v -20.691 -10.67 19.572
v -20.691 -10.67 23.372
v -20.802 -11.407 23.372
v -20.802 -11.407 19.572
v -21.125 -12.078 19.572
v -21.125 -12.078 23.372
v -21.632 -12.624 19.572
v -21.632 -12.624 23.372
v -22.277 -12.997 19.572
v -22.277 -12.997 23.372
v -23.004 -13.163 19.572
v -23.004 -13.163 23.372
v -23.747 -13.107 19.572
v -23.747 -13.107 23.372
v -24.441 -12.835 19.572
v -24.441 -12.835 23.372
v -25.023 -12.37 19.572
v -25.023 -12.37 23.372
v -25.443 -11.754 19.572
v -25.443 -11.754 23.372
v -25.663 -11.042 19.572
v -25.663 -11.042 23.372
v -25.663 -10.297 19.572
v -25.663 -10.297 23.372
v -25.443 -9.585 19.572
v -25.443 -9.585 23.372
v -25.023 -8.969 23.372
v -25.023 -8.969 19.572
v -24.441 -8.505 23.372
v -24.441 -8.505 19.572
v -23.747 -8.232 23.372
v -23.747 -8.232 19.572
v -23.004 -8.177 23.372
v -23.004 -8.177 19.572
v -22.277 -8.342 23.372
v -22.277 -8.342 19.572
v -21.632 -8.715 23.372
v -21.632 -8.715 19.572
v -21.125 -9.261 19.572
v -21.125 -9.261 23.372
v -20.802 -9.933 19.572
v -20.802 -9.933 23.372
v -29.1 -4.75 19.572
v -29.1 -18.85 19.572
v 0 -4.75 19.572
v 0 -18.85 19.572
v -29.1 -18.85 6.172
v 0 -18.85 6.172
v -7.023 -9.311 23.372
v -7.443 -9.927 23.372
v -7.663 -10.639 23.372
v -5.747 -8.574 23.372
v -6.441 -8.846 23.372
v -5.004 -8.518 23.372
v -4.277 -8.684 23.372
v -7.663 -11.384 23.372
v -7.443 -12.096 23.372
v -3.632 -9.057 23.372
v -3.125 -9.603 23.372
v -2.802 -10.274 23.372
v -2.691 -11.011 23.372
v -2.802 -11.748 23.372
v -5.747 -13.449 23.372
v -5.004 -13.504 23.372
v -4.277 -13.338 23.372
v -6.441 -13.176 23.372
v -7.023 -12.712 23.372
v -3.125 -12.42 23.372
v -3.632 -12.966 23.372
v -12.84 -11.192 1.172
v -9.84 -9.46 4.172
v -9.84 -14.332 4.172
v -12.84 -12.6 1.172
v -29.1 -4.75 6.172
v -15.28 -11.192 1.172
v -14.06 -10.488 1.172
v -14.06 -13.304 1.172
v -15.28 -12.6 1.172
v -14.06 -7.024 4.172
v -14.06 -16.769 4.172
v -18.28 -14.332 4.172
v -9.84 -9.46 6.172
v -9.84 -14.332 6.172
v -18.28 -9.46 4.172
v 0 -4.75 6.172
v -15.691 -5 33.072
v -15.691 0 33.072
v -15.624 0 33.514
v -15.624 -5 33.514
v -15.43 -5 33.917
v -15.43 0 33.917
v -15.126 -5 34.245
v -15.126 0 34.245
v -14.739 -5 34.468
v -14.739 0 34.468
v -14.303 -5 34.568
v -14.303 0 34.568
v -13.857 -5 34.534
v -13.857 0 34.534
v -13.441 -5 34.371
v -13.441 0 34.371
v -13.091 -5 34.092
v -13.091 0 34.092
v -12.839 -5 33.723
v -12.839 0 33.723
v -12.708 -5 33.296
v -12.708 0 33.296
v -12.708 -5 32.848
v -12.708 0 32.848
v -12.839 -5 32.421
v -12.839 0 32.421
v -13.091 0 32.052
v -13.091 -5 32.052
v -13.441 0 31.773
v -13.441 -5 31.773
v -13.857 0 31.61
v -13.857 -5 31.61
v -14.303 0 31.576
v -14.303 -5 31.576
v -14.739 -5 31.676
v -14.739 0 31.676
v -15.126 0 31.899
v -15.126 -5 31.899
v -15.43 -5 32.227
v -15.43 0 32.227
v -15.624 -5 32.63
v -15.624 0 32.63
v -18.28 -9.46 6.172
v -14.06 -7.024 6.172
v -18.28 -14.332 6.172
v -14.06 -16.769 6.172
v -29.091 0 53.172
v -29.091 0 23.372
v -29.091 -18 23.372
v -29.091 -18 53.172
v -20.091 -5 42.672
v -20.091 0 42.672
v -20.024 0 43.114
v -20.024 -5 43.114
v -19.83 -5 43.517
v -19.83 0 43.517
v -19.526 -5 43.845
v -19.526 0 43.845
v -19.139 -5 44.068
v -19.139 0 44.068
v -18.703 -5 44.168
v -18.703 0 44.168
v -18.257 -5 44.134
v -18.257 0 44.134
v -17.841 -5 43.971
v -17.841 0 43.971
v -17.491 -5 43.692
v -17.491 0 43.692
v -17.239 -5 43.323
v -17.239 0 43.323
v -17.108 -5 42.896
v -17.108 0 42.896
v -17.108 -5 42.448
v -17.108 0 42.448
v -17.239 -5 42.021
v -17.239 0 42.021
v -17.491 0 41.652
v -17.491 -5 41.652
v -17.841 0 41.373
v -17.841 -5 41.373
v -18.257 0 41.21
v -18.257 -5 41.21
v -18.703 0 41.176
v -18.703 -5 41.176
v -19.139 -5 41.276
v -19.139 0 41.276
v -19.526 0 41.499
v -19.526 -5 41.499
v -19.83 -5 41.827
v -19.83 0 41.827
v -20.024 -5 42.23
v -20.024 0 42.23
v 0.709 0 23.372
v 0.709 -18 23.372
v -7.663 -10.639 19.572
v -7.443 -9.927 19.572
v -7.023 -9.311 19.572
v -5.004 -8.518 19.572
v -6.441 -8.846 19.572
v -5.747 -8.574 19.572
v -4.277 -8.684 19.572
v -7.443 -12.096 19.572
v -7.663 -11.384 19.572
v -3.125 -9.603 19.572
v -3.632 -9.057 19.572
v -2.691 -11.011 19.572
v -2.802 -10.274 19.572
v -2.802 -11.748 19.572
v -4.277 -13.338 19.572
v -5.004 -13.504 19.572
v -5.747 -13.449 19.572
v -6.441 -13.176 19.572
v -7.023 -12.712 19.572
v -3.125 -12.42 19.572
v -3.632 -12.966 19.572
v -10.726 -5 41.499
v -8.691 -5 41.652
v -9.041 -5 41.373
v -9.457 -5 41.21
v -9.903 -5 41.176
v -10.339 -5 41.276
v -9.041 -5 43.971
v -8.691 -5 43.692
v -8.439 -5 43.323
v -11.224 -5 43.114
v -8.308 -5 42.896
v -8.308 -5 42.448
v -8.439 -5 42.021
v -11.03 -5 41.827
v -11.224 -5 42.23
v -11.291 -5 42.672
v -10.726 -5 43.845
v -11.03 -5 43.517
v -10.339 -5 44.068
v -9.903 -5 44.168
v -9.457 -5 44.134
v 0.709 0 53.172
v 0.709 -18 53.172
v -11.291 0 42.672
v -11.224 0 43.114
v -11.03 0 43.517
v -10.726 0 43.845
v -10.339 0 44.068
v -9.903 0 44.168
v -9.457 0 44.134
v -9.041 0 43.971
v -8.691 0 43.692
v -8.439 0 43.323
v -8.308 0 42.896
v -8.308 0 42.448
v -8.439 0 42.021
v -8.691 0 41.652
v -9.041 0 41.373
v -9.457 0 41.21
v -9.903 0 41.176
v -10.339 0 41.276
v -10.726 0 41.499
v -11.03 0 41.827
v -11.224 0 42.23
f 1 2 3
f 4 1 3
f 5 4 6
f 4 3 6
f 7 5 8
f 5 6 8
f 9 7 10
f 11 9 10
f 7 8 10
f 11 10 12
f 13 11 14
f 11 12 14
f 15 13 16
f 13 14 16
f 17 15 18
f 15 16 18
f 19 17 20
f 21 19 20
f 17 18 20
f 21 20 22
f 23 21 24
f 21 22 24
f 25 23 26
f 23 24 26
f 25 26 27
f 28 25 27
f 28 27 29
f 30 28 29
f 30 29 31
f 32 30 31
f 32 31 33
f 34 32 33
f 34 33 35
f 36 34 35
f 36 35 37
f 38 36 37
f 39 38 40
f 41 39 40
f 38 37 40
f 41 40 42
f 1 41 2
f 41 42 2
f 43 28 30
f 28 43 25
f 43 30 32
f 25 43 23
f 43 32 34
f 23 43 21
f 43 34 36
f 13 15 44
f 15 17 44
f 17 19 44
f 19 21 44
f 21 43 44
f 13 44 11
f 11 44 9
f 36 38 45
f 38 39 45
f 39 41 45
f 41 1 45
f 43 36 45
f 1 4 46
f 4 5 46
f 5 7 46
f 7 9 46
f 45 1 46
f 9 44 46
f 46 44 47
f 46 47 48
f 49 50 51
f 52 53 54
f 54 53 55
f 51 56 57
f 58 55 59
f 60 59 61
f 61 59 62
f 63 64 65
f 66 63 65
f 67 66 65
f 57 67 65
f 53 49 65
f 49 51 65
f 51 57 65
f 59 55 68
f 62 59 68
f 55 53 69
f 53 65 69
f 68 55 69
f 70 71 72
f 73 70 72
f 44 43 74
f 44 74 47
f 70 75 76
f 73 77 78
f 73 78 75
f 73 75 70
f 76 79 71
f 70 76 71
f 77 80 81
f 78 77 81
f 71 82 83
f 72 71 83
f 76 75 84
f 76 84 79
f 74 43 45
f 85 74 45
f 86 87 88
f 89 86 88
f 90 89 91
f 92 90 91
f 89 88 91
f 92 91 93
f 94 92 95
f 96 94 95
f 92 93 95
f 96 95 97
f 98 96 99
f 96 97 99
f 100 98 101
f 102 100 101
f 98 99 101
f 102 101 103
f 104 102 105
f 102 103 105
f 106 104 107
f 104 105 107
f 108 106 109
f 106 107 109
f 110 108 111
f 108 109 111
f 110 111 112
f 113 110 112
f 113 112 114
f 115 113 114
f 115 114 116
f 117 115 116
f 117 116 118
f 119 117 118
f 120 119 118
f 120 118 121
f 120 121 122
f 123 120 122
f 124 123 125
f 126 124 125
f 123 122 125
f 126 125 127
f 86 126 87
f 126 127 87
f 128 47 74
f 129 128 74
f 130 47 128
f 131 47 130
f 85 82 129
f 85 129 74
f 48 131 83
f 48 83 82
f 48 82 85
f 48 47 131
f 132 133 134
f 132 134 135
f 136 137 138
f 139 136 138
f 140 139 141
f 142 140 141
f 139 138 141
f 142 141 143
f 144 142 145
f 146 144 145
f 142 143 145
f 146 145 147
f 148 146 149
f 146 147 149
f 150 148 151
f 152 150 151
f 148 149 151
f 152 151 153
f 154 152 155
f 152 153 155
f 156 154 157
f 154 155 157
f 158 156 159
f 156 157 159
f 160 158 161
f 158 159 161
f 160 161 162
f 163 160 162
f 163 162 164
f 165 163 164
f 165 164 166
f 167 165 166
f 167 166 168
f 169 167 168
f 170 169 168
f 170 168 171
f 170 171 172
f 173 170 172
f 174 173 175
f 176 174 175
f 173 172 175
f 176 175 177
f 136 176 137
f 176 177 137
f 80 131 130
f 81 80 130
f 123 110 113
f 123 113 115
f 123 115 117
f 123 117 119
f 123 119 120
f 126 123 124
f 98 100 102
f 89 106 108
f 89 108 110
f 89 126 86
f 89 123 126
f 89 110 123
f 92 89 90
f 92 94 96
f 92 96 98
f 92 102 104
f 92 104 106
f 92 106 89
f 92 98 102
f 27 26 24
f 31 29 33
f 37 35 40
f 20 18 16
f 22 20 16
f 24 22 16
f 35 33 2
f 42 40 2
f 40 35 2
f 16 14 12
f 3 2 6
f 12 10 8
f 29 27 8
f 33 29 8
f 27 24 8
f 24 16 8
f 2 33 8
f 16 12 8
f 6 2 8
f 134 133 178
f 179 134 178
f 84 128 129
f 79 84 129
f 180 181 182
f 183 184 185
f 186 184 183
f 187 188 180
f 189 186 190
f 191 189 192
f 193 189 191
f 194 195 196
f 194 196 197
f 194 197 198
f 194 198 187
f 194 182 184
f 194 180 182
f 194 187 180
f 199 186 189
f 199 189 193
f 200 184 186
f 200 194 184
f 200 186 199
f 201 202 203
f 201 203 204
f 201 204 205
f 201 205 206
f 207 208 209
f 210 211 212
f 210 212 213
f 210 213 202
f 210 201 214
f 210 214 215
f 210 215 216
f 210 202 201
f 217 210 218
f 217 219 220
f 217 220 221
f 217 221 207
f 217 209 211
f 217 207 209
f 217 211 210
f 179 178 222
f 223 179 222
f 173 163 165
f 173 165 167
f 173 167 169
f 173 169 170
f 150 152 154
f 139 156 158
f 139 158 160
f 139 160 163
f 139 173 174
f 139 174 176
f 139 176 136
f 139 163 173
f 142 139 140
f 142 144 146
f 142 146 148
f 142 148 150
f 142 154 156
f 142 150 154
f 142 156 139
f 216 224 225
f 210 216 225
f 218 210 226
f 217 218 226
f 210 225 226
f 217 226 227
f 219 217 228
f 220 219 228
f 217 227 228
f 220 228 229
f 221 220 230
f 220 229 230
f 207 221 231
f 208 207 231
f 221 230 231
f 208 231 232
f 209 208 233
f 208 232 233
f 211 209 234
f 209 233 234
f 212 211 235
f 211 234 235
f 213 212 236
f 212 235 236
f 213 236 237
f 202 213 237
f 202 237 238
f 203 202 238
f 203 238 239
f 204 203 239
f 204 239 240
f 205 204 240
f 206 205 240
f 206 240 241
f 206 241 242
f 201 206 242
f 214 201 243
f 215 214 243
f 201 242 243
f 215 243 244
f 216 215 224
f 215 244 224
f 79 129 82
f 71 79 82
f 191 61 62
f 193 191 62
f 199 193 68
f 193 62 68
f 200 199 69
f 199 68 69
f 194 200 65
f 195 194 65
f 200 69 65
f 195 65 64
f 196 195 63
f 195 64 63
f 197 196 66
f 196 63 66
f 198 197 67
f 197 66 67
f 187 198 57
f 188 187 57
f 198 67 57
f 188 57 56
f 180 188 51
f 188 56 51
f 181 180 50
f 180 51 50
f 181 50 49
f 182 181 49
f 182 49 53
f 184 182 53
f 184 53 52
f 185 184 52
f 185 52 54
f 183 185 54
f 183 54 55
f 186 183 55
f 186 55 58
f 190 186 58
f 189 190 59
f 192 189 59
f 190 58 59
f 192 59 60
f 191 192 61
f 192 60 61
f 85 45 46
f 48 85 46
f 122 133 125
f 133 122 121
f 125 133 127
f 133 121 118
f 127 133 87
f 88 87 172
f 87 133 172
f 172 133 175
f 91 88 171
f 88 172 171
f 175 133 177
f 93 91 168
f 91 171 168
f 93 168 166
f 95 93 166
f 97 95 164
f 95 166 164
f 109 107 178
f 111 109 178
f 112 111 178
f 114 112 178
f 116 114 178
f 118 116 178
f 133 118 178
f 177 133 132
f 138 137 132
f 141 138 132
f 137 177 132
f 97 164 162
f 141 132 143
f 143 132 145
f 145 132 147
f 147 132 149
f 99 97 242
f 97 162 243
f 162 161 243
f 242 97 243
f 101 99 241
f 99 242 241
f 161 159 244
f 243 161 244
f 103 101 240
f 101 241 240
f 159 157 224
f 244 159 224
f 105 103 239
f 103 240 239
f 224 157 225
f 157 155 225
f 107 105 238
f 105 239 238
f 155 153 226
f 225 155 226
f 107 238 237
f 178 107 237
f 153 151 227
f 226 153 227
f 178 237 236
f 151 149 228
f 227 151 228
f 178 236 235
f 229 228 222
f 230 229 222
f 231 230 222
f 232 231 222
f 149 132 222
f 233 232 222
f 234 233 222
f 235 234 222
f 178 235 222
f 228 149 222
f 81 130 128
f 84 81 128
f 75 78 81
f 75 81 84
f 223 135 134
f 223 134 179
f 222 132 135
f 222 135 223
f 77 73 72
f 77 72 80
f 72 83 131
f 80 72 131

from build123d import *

# Parameters (mm, degrees)
F0_W     = 29.8
F0_H     = 29.8
F1_DEPTH = 18
F2_R     = 2.5
F3_DEPTH = 3.8
F4_W     = 29.1
F4_H     = 14.1
F4_R     = 2.5
F5_DEPTH = 13.4
F6_R     = 1.5
F7_DEPTH = 5
F9_DEPTH = 5
F10_SIZE = 3


with BuildPart() as f1:
    # F0 (on Front) → F1 (new body)
    with BuildSketch(Plane.XZ):
        with Locations((-14.1908051446, 38.2720534908)):
            Rectangle(F0_W, F0_H)
    extrude(amount=F1_DEPTH)

    # F6 (on face) → F7 (cut)
    with BuildSketch(Plane(origin=(0, 0, 0), x_dir=(-1, 0, 0), z_dir=(0, 1, 0))):
        with Locations((9.7908051446, 42.6720534908)):
            Circle(F6_R)
        with Locations((18.5908051446, 42.6720534908)):
            Circle(F6_R)
        with Locations((14.1908051446, 33.0720534908)):
            Circle(F6_R)
    extrude(amount=-F7_DEPTH, mode=Mode.SUBTRACT)


with BuildPart() as f3:
    # F2 (on face) → F3 (new body)
    with BuildSketch(Plane(origin=(0, 0, 23.3720534908), x_dir=(1, 0, 0), z_dir=(0, 0, -1))):
        with Locations((-5.1908051446, 11.0112141835)):
            Circle(F2_R)
    extrude(amount=F3_DEPTH)


with BuildPart() as f3b:
    # F2 (on face) → F3, piece 2 (new body)
    with BuildSketch(Plane(origin=(0, 0, 23.3720534908), x_dir=(1, 0, 0), z_dir=(0, 0, -1))):
        with Locations((-23.1908051446, 10.6696703852)):
            Circle(F2_R)
    extrude(amount=F3_DEPTH)

    # F4 (on face) → F5 (join)
    with BuildSketch(Plane(origin=(0, 0, 19.5720534908), x_dir=(1, 0, 0), z_dir=(0, 0, -1))):
        with Locations((-14.55, 11.7996069203)):
            Rectangle(F4_W, F4_H)
        with Locations((-23.1908051446, 10.6696703852)):
            Circle(F4_R, mode=Mode.SUBTRACT)
        with Locations((-23.1908051446, 10.6696703852)):
            Circle(F4_R)
    extrude(amount=F5_DEPTH)

    # F8 (on face) → F9 (join)
    with BuildSketch(Plane(origin=(0, 0, 6.1720534908), x_dir=(1, 0, 0), z_dir=(0, 0, -1))):
        Polygon((-18.2797089219, 14.3322658172), (-18.2797089219, 9.4597849616), (-14.0600167215, 7.0235445338), (-9.8403245211, 9.4597849616), (-9.8403245211, 14.3322658172), (-14.0600167215, 16.7685062451), align=None)
    extrude(amount=F9_DEPTH)

    # F10
    f10_edges = [f3b.edges().sort_by_distance(p)[0] for p in [
        (-11.950171, -15.550386, 1.172053),
        (-18.279709, -11.896025, 1.172053),
        (-16.169863, -15.550386, 1.172053),
        (-16.169863, -8.241665, 1.172053),
        (-11.950171, -8.241665, 1.172053),
        (-9.840325, -11.896025, 1.172053),
    ]]
    chamfer(f10_edges, length=F10_SIZE)


solid = Compound([f1.part, f3.part, f3b.part])
